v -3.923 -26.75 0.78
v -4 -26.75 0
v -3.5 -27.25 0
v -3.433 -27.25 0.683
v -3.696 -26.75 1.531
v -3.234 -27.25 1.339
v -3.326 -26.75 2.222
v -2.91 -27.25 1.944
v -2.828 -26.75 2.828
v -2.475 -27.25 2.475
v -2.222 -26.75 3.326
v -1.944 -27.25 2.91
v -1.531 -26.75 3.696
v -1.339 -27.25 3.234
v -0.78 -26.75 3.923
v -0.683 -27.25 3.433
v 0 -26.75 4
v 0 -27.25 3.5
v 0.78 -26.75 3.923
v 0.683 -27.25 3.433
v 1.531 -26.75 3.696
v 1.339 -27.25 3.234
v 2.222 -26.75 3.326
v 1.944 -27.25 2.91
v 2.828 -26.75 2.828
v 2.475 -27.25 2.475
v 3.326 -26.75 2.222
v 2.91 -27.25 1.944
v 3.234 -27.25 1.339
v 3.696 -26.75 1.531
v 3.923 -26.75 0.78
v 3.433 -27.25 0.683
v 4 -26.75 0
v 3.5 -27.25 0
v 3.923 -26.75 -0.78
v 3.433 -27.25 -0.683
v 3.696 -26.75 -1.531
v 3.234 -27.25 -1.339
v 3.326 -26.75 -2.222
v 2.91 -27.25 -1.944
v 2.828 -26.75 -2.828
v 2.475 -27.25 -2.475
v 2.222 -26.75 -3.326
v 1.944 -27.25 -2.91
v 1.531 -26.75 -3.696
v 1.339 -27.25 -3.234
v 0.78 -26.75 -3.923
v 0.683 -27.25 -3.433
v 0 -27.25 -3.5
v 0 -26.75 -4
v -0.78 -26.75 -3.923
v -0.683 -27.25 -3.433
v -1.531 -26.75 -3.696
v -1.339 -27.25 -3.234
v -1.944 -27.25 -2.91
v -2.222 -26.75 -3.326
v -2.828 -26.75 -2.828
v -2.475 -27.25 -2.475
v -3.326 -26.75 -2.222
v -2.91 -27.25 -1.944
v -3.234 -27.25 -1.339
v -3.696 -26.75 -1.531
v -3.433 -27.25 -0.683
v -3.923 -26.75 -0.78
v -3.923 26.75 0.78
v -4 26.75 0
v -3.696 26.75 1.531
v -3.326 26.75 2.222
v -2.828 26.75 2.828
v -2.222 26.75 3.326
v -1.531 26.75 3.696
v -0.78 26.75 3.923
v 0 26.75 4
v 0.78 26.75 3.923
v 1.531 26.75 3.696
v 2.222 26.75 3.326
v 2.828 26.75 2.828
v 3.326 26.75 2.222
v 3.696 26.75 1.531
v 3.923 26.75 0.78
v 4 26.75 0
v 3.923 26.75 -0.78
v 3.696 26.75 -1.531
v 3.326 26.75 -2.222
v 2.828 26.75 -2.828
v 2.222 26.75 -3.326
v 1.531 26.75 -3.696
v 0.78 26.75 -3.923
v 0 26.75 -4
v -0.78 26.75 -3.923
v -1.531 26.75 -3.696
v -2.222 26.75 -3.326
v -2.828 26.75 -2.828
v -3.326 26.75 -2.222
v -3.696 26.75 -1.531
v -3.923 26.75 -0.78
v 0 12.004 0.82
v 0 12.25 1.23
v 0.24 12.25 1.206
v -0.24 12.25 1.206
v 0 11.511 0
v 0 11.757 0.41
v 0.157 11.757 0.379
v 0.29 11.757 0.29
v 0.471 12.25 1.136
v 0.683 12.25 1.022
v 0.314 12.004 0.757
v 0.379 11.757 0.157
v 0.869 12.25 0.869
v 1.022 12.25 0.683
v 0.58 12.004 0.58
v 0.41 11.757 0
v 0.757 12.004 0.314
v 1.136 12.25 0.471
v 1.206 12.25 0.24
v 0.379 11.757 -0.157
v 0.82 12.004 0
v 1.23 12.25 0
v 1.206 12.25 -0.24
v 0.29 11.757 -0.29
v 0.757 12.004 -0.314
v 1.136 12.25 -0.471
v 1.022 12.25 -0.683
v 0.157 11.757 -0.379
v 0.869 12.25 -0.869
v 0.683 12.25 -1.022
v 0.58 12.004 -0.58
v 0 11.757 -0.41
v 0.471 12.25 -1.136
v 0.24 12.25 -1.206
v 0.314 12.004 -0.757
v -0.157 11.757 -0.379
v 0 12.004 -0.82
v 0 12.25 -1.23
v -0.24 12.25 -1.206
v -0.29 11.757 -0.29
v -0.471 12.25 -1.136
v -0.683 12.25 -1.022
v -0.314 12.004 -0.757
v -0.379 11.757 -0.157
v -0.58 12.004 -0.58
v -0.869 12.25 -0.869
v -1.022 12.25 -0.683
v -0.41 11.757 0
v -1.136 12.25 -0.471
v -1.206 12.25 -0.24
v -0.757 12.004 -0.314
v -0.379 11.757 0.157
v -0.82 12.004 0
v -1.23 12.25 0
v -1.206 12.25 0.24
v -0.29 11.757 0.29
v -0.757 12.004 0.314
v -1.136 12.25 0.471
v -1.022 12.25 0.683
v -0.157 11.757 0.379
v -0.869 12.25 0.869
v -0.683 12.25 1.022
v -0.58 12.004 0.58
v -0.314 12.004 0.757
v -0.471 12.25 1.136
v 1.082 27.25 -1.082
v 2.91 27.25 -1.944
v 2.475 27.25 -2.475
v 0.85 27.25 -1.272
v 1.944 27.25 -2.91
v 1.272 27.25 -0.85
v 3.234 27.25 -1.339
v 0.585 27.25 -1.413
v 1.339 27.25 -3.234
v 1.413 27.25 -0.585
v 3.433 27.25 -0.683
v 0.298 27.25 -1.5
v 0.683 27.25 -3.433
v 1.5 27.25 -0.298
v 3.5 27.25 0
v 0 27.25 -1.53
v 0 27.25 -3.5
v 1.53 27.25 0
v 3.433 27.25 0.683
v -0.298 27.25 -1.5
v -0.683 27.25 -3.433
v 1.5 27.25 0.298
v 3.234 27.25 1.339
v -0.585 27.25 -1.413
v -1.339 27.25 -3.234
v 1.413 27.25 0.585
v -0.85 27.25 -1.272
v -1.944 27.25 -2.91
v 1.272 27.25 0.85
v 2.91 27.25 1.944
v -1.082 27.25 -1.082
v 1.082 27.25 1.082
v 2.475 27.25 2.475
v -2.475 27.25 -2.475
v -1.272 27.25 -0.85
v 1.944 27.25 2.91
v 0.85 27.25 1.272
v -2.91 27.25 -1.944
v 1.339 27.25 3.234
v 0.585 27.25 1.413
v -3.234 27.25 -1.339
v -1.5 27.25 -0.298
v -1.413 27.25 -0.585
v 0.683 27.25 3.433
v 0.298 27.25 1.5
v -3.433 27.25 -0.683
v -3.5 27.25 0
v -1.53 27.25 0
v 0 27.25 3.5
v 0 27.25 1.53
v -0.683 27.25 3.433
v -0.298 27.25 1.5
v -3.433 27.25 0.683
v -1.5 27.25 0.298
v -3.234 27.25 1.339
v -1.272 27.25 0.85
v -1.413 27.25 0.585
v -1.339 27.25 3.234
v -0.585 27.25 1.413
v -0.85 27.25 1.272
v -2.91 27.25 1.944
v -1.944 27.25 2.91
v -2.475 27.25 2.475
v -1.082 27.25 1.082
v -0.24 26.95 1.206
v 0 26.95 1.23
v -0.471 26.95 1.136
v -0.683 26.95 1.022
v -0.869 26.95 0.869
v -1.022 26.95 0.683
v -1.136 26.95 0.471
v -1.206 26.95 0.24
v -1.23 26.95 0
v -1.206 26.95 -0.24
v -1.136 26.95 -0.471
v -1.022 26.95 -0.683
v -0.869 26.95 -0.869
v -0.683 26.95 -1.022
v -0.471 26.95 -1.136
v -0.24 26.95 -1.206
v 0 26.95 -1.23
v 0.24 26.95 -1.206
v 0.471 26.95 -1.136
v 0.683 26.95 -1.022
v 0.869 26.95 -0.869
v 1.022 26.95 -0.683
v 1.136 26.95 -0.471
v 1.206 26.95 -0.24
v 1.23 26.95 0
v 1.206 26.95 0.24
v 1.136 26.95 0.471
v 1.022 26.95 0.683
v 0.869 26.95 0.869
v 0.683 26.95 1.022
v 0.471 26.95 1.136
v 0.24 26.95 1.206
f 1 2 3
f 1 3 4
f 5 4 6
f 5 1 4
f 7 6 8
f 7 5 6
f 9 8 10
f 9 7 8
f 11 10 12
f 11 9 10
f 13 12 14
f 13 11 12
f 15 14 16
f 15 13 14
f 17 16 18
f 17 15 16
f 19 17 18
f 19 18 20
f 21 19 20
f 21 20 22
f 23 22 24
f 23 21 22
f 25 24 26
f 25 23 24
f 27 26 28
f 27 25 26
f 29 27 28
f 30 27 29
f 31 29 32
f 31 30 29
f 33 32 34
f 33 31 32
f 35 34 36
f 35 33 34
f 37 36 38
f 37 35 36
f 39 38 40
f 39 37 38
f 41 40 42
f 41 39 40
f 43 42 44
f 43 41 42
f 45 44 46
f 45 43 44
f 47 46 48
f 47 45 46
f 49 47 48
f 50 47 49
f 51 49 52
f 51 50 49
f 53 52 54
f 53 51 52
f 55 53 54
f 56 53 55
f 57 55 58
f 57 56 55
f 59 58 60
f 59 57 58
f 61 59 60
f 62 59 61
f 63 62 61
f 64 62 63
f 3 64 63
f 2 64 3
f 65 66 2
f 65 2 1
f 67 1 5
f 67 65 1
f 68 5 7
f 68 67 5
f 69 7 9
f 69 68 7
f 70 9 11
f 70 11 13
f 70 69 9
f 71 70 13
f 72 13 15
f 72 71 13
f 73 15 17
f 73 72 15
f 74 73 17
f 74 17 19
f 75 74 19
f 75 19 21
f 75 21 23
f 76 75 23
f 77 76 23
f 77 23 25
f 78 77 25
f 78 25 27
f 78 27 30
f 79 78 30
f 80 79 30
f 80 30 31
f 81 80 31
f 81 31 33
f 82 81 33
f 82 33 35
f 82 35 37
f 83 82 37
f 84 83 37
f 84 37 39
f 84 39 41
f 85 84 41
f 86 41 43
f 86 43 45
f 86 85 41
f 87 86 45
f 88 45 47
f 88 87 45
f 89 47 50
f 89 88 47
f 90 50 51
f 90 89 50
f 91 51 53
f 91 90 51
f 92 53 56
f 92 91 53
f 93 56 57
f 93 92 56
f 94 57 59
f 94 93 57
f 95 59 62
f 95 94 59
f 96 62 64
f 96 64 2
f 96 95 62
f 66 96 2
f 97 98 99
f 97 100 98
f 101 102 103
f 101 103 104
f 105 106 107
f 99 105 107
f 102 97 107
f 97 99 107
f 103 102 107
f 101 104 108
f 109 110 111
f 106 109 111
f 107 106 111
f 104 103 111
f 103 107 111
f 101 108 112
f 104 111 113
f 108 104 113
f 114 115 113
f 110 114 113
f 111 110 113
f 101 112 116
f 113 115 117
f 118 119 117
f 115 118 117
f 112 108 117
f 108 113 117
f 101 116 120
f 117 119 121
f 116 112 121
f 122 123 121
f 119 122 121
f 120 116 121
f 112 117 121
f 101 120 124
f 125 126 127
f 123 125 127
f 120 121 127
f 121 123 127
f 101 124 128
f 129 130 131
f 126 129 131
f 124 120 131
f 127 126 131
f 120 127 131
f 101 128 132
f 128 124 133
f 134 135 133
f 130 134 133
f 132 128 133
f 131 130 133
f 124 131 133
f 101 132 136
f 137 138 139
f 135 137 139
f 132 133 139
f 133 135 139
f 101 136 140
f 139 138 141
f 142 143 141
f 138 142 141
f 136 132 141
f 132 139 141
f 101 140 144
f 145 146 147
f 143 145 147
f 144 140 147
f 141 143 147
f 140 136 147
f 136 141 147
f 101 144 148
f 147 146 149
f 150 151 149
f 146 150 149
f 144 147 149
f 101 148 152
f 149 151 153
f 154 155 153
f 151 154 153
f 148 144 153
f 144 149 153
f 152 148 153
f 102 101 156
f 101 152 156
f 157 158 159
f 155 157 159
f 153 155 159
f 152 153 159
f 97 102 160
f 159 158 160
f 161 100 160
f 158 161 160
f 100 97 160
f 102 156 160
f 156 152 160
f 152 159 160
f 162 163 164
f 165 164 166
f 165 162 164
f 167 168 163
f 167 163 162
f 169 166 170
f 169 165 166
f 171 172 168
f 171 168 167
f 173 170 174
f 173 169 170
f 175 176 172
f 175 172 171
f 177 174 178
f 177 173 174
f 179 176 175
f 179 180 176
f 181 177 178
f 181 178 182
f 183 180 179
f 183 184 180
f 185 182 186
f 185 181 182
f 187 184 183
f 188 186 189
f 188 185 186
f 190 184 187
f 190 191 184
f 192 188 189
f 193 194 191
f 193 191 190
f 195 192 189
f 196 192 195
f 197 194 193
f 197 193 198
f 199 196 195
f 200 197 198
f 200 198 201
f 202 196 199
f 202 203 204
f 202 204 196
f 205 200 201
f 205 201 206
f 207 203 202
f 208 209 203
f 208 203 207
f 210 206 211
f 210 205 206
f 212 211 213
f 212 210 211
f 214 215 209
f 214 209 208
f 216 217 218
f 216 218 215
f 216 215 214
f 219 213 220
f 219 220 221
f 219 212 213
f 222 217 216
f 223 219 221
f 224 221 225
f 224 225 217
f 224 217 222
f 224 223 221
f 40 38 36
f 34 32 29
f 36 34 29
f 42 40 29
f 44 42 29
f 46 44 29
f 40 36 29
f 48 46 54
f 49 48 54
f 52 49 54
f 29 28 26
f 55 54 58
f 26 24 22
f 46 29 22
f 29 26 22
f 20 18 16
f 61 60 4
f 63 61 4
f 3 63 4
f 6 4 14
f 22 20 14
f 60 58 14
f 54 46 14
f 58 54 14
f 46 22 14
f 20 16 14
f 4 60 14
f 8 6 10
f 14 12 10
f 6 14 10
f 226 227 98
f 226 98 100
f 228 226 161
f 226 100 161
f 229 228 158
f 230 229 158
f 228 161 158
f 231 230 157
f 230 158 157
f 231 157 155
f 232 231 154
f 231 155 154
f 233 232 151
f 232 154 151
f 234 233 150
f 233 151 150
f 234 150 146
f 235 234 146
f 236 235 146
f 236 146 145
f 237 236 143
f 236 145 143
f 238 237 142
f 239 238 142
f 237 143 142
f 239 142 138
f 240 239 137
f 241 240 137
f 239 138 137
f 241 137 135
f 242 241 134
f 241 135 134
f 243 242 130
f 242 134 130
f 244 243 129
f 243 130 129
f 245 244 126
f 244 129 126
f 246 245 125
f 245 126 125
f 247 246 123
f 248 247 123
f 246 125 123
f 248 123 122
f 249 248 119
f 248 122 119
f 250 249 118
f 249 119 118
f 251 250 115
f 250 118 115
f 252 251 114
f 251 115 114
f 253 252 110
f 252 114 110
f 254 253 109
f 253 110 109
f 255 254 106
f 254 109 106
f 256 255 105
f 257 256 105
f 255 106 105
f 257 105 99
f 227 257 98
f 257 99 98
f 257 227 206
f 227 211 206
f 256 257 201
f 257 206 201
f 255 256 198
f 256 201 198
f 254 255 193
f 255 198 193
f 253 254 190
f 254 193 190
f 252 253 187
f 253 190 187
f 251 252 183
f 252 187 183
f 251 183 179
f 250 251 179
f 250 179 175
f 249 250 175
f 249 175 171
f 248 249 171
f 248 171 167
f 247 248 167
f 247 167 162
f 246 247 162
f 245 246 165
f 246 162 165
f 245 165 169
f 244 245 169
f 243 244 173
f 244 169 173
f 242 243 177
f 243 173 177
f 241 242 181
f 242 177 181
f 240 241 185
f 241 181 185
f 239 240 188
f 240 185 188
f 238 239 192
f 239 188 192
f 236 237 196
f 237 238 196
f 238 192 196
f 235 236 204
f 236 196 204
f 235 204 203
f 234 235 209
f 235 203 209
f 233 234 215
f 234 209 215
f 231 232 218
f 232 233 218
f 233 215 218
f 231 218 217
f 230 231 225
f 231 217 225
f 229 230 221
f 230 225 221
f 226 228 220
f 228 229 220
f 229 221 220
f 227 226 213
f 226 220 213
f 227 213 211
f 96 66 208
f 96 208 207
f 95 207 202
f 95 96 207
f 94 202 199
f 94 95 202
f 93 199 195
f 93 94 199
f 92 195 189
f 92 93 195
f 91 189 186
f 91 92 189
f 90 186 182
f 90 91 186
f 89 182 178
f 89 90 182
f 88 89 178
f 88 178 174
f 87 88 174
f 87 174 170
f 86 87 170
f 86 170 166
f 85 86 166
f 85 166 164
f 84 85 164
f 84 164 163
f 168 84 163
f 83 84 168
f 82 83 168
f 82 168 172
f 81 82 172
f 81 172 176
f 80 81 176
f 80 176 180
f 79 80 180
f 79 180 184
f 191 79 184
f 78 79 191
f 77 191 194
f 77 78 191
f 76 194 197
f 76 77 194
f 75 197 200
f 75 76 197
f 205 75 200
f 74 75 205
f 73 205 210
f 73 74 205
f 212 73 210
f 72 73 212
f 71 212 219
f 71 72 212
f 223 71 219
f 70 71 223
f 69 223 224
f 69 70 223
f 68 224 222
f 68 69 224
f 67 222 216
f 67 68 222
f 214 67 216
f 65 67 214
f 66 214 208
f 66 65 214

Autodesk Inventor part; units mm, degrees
ref_plane "YZ Plane" through (0, 0, 0) normal (1, 0, 0) x (0, 1, 0)
ref_plane "XZ Plane" through (0, 0, 0) normal (0, 1, 0) x (-1, 0, 0)
ref_plane "XY Plane" through (0, 0, 0) normal (0, 0, 1) x (1, 0, 0)
sketch "Sketch1" plane through (0, 0, 0) normal (0, 0, 1) x (1, 0, 0)
  line L0 (-4.8, 0) -> (0.8, 0) construction
  line L1 (0, -38.15) -> (0, 38.15) construction
  line L2 (-4, 27.25) -> (0, 27.25)
  line L3 (0, 27.25) -> (0, -27.25)
  line L4 (0, -27.25) -> (-4, -27.25)
  line L5 (-4, -27.25) -> (-4, 27.25)
  point P0 (0, 0)
  dimension "d1" = 54.5
  dimension "d16" = 8
revolve "Revolution1" add sketch "Sketch1" angle 360 about axis through (0, -10, 0) along (0, 1, 0)
sketch "Sketch2" plane through (0, 27.25, 0) normal (0, 1, 0) x (1, 0, 0)
  circle A0 centre (0, 0) radius 4 projected
hole "Hole1" at (0, 27.25, 0) direction (0, -1, 0) diameter 2.459 depth 15 tip angle 118 thread size "M3x0.5" class "6H" standard "ISO Metric profile"
mirror "Espelhar1" [suppressed]
chamfer "Chamfer1" distance 0.5 angle 45 2 edges at (4, -27.25, 0) (4, 27.25, 0)
chamfer "Chamfer2" distance 0.3 angle 45 1 edges at (0, 27.25, -1.2295)
properties part number "GRJ-05-103" material "Poliacetal WT"
